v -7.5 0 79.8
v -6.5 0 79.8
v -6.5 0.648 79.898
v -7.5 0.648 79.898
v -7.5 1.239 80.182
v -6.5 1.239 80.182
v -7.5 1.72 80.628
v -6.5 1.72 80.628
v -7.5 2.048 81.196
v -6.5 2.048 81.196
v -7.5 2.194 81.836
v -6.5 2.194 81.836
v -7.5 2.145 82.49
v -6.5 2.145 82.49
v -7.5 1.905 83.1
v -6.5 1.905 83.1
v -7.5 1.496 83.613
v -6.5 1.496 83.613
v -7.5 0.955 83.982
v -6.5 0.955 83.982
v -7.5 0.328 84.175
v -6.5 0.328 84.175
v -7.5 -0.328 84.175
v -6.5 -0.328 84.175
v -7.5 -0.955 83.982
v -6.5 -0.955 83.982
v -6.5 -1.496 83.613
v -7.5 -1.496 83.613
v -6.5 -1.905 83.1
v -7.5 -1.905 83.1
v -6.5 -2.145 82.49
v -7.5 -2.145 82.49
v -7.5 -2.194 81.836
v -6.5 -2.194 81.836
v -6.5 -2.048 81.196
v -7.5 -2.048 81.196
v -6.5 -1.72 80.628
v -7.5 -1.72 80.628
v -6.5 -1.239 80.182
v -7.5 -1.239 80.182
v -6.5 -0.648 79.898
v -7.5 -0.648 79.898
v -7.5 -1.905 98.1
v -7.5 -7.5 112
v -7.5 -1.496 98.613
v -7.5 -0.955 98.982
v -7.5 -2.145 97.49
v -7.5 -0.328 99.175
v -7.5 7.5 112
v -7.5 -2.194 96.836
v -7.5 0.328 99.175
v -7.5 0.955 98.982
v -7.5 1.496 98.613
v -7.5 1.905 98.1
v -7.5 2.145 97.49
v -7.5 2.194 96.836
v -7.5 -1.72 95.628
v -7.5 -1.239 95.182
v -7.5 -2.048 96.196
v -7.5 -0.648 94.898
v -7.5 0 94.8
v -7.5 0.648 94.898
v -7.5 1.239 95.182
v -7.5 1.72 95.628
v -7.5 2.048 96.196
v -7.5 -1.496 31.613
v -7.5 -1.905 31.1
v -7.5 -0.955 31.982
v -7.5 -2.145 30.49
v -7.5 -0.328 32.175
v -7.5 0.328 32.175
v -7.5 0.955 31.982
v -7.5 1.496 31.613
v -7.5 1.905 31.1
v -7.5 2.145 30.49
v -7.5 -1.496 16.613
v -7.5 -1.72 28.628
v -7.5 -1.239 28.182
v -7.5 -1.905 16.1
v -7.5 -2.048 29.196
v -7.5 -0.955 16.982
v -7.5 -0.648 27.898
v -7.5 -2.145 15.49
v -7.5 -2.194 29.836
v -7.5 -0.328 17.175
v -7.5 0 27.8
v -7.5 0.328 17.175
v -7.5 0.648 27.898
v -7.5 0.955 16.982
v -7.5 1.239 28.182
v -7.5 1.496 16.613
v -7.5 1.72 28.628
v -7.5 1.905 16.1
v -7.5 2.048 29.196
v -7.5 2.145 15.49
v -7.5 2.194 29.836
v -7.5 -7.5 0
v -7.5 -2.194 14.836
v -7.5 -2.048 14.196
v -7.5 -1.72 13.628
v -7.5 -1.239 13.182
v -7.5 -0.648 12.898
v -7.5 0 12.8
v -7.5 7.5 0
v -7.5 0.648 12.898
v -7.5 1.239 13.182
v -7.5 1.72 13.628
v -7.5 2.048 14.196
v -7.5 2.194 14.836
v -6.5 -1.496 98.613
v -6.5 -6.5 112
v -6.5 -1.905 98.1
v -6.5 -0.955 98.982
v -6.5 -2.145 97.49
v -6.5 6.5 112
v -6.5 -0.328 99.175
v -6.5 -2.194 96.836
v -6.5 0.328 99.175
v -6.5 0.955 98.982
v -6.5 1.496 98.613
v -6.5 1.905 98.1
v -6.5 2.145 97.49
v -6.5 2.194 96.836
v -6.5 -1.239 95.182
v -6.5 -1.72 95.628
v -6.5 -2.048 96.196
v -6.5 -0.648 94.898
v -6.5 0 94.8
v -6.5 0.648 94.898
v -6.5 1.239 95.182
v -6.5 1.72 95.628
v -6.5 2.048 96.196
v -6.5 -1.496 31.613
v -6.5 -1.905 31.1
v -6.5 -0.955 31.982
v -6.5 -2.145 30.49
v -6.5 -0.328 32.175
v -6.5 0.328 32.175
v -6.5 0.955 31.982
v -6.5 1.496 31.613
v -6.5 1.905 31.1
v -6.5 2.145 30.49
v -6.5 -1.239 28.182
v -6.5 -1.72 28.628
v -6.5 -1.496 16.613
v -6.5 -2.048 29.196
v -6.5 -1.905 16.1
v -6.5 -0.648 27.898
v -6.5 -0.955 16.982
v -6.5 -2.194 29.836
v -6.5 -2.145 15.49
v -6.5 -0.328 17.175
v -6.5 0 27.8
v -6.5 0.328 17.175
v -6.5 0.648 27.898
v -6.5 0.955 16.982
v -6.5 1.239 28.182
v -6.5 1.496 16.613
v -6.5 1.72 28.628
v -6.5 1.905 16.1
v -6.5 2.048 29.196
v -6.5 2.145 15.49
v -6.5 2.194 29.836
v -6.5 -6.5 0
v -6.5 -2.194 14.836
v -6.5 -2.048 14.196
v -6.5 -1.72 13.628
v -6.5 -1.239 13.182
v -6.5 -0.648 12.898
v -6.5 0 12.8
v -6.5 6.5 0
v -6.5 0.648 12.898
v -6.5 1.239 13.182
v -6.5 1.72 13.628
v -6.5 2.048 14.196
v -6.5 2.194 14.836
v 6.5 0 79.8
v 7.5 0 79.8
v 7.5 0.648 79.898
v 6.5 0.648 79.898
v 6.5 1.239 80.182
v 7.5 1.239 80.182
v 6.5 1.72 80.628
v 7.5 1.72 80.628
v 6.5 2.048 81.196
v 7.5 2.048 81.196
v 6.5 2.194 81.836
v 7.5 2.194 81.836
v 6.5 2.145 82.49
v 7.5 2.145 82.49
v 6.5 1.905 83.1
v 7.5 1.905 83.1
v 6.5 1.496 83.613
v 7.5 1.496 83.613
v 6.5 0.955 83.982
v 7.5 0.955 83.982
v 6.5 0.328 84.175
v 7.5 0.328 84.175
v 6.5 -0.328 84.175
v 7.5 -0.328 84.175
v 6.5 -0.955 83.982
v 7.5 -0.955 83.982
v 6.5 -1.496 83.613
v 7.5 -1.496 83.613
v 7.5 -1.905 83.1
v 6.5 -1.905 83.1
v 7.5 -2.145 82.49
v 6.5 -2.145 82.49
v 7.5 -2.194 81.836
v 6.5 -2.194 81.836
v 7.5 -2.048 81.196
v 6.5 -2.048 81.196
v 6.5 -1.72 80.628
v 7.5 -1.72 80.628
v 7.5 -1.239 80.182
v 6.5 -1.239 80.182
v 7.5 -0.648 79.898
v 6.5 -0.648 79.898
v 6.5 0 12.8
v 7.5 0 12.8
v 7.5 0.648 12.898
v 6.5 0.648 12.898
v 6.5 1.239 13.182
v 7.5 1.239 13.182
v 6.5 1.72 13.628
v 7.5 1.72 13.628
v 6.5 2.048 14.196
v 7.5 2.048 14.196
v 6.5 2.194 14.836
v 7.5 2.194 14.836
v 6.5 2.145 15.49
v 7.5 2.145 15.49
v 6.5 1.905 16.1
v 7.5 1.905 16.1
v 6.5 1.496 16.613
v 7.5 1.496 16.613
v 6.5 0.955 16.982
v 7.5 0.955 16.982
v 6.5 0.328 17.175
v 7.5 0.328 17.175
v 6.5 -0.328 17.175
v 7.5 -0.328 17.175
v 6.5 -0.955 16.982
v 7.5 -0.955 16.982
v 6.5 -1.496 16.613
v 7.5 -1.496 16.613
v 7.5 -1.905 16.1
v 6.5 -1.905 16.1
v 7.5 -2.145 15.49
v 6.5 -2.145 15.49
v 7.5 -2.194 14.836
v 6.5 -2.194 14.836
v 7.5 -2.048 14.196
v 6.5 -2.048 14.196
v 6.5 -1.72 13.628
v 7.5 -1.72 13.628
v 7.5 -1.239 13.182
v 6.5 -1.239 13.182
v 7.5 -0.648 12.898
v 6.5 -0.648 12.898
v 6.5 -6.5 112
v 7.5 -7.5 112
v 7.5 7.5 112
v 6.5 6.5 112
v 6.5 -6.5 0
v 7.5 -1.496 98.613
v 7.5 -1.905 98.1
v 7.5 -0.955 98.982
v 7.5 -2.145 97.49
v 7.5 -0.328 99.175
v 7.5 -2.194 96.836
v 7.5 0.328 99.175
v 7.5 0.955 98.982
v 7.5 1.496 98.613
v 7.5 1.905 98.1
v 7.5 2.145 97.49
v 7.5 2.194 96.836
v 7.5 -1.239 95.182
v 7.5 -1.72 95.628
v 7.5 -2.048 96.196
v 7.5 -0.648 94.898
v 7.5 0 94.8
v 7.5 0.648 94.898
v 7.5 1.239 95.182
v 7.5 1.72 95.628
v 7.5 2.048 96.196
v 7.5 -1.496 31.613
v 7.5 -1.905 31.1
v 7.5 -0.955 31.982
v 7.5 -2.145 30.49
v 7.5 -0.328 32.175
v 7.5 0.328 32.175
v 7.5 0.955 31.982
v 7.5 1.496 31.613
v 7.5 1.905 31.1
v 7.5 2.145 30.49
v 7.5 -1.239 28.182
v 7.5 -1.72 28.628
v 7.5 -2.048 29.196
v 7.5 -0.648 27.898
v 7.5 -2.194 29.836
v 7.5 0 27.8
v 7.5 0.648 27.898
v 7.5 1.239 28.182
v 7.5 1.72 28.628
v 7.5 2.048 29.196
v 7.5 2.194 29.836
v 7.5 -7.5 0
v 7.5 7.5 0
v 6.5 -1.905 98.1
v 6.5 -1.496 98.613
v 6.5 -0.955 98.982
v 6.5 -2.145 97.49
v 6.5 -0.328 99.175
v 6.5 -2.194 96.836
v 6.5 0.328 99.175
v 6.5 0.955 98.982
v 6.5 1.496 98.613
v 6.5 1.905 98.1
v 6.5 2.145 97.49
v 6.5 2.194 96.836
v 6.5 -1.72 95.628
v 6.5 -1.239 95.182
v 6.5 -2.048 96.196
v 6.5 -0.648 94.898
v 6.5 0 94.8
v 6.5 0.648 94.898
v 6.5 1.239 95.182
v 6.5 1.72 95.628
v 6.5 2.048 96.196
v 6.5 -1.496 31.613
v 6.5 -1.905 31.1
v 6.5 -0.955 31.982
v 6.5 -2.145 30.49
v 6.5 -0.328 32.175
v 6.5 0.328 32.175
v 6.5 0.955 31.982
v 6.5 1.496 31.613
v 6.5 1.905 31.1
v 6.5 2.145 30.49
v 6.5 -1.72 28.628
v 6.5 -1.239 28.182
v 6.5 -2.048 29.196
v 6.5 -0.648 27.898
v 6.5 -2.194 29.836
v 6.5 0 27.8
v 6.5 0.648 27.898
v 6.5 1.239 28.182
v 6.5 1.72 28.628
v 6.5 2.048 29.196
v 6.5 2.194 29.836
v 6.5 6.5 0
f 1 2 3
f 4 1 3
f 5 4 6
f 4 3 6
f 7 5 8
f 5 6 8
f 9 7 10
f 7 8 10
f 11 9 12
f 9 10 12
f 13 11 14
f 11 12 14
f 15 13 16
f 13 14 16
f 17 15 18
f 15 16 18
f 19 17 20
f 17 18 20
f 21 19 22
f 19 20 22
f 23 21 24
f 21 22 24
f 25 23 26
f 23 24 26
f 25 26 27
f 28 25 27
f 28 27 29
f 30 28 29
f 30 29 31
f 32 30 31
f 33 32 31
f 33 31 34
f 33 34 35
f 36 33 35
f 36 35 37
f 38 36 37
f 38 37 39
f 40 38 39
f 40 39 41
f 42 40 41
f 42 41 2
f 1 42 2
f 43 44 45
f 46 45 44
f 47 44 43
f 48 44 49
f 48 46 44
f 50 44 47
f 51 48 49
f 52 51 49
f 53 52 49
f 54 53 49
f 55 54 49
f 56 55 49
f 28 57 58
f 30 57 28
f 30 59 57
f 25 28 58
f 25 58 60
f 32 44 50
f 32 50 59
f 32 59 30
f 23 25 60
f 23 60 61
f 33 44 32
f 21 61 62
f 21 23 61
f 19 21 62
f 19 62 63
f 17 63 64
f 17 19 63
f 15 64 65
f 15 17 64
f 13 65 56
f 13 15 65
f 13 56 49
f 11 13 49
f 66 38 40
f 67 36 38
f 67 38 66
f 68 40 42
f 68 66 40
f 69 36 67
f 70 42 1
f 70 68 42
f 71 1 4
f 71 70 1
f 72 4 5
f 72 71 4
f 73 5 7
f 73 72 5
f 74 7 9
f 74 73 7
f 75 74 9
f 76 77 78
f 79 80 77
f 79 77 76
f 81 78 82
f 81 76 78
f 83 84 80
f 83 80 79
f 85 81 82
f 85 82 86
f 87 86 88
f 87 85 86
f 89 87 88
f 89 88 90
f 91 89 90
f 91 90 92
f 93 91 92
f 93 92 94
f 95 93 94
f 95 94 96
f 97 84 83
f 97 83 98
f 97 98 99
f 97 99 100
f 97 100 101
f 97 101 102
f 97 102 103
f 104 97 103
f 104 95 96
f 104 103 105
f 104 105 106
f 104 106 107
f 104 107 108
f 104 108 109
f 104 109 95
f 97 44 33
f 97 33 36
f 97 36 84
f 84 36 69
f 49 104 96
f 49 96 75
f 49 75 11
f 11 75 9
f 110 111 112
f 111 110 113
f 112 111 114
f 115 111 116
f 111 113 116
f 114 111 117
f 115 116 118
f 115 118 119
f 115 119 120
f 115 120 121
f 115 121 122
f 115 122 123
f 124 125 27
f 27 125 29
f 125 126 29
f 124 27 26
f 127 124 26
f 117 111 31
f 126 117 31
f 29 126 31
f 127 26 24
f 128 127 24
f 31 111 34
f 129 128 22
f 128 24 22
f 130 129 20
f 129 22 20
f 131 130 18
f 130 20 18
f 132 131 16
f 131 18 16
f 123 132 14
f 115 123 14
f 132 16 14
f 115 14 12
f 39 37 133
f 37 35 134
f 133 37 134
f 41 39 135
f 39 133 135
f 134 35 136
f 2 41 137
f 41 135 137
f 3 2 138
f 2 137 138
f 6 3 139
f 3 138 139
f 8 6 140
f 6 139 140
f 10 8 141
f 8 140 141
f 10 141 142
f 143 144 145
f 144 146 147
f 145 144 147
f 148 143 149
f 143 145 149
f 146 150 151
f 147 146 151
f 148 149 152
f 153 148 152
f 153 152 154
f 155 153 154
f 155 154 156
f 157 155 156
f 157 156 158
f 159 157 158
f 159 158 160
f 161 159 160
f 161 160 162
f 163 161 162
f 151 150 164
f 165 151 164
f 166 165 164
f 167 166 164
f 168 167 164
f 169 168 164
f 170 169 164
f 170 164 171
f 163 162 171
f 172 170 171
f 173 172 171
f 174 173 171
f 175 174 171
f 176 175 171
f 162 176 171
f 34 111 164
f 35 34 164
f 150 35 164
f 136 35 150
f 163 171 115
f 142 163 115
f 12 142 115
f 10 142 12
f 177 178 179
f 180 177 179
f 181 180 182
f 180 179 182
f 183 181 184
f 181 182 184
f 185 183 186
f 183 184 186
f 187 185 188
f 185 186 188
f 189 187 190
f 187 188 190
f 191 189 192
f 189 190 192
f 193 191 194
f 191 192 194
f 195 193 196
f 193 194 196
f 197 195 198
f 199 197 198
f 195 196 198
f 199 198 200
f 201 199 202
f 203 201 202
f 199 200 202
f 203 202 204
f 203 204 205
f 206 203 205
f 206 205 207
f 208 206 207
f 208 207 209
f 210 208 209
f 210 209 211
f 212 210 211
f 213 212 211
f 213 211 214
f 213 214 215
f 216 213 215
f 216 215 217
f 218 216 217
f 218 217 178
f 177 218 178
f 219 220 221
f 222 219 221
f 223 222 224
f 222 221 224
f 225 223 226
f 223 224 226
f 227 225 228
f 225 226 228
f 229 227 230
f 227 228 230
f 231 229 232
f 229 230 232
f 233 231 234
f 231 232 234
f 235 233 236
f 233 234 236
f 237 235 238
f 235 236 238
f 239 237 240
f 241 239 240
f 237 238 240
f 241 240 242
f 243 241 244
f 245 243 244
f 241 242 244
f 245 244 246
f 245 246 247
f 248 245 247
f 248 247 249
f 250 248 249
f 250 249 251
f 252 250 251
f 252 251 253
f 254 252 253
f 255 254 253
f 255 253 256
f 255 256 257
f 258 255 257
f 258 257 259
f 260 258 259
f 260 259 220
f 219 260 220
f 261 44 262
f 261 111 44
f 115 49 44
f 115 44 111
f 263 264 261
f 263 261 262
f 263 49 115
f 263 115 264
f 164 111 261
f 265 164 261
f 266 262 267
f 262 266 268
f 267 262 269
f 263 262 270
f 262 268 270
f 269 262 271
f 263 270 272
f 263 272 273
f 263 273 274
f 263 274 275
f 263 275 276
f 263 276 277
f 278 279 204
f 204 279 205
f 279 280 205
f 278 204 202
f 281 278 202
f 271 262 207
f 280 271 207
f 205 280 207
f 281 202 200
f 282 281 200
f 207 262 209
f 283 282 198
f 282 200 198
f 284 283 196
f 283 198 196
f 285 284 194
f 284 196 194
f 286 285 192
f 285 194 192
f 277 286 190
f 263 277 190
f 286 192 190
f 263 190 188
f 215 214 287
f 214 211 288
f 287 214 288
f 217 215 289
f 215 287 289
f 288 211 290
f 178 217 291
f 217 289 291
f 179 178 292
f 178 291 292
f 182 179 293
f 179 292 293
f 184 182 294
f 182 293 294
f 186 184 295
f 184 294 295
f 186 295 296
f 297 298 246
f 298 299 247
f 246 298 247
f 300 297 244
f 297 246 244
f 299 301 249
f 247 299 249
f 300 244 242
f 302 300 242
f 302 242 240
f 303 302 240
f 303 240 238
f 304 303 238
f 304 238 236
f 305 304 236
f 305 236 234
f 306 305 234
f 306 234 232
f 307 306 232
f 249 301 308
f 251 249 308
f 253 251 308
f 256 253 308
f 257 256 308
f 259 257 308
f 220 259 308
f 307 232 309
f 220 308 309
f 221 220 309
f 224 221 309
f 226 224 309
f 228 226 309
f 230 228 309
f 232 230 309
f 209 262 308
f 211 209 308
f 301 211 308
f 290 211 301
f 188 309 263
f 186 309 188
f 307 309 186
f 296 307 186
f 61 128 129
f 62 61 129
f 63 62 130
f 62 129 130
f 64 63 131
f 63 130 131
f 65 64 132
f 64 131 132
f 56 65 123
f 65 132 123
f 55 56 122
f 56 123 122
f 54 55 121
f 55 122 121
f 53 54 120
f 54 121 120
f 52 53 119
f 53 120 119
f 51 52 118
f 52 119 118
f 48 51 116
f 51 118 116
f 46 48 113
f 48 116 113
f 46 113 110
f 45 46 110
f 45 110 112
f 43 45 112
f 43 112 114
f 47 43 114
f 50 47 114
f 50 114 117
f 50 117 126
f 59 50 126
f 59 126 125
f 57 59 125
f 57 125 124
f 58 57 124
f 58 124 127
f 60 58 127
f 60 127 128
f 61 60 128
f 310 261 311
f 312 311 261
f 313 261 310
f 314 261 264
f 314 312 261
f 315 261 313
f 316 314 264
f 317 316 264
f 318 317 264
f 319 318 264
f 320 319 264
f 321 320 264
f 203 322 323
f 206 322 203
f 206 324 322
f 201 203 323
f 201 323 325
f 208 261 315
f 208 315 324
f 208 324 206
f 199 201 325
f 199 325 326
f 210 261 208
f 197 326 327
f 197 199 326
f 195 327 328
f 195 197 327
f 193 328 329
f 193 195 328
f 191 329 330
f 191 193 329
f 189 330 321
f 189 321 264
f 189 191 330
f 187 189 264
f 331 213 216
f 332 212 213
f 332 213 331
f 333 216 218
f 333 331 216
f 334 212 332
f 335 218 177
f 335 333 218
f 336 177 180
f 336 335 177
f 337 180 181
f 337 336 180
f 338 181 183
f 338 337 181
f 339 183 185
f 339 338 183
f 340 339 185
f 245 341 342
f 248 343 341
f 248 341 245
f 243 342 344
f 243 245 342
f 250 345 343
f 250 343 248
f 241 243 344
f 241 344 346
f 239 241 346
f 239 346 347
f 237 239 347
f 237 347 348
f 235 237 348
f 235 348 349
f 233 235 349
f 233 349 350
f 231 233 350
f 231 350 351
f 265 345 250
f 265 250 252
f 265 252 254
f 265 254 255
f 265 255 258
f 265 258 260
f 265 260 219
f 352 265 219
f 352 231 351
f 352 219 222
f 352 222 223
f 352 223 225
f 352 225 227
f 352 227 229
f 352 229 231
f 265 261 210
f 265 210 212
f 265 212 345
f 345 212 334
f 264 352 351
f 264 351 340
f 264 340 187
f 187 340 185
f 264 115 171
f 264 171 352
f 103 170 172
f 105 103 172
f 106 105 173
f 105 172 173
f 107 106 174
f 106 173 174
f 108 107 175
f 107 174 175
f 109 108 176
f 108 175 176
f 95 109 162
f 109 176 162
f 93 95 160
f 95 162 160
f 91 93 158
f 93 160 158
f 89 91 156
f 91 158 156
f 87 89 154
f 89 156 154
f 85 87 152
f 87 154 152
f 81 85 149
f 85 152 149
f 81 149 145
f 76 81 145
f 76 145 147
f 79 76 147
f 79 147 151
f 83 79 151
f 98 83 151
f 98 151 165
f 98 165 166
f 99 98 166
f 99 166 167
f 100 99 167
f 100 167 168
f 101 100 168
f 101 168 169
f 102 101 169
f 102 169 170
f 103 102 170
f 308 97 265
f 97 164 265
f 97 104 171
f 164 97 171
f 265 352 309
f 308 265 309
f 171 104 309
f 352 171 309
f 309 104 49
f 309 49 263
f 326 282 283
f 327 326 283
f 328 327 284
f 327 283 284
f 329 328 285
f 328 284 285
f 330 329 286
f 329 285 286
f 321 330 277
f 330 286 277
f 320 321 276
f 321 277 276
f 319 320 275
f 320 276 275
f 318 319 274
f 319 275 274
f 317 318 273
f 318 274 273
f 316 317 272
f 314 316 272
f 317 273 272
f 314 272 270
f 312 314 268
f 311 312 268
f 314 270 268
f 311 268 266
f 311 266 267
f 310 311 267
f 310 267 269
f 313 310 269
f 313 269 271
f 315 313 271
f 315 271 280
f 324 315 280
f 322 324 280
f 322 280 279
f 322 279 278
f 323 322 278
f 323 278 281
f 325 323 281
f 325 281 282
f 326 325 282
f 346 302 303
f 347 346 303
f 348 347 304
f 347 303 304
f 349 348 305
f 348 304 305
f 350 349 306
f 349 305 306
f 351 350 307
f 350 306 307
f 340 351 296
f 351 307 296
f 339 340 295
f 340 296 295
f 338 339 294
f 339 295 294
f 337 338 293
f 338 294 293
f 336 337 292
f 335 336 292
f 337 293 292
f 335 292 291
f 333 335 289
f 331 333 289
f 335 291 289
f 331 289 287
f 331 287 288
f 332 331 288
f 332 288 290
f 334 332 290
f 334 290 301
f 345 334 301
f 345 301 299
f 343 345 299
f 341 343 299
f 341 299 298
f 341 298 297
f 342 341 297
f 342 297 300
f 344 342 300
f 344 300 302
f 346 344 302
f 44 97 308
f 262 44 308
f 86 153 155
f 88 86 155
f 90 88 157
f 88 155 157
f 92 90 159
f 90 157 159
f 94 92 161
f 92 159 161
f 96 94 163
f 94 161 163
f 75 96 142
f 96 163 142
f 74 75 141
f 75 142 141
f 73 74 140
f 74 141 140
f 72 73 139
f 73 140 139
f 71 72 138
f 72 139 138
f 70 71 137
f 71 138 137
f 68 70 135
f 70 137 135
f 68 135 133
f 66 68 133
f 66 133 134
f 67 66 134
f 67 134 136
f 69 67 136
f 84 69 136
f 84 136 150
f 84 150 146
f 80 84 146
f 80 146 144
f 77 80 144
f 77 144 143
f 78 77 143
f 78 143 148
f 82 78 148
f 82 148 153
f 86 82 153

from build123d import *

# Parameters (mm, degrees)
SKETCH_1_W          = 15
SKETCH_1_H          = 15
SKETCH_1_W_2        = 13
SKETCH_1_H_2        = 13
EXTRUDE_1_DEPTH     = 112
SKETCH_3_R          = 2.2
CUT_EXTRUDE_1_DEPTH = 55


with BuildPart() as part:
    # 草图1 → 凸台-拉伸1 (new body)
    with BuildSketch(Plane.XY):
        Rectangle(SKETCH_1_W, SKETCH_1_H)
        Rectangle(SKETCH_1_W_2, SKETCH_1_H_2, mode=Mode.SUBTRACT)
    extrude(amount=EXTRUDE_1_DEPTH)

    # 草图3 → 切除-拉伸1 (cut)
    with BuildSketch(Plane(origin=(7.5, 0, 0), x_dir=(0, 0, -1), z_dir=(1, 0, 0))):
        with Locations((-15, 0)):
            Circle(SKETCH_3_R)
        with Locations((-30, 0)):
            Circle(SKETCH_3_R)
        with Locations((-97, 0)):
            Circle(SKETCH_3_R)
        with Locations((-82, 0)):
            Circle(SKETCH_3_R)
    extrude(amount=-CUT_EXTRUDE_1_DEPTH, mode=Mode.SUBTRACT)


solid = part.part
